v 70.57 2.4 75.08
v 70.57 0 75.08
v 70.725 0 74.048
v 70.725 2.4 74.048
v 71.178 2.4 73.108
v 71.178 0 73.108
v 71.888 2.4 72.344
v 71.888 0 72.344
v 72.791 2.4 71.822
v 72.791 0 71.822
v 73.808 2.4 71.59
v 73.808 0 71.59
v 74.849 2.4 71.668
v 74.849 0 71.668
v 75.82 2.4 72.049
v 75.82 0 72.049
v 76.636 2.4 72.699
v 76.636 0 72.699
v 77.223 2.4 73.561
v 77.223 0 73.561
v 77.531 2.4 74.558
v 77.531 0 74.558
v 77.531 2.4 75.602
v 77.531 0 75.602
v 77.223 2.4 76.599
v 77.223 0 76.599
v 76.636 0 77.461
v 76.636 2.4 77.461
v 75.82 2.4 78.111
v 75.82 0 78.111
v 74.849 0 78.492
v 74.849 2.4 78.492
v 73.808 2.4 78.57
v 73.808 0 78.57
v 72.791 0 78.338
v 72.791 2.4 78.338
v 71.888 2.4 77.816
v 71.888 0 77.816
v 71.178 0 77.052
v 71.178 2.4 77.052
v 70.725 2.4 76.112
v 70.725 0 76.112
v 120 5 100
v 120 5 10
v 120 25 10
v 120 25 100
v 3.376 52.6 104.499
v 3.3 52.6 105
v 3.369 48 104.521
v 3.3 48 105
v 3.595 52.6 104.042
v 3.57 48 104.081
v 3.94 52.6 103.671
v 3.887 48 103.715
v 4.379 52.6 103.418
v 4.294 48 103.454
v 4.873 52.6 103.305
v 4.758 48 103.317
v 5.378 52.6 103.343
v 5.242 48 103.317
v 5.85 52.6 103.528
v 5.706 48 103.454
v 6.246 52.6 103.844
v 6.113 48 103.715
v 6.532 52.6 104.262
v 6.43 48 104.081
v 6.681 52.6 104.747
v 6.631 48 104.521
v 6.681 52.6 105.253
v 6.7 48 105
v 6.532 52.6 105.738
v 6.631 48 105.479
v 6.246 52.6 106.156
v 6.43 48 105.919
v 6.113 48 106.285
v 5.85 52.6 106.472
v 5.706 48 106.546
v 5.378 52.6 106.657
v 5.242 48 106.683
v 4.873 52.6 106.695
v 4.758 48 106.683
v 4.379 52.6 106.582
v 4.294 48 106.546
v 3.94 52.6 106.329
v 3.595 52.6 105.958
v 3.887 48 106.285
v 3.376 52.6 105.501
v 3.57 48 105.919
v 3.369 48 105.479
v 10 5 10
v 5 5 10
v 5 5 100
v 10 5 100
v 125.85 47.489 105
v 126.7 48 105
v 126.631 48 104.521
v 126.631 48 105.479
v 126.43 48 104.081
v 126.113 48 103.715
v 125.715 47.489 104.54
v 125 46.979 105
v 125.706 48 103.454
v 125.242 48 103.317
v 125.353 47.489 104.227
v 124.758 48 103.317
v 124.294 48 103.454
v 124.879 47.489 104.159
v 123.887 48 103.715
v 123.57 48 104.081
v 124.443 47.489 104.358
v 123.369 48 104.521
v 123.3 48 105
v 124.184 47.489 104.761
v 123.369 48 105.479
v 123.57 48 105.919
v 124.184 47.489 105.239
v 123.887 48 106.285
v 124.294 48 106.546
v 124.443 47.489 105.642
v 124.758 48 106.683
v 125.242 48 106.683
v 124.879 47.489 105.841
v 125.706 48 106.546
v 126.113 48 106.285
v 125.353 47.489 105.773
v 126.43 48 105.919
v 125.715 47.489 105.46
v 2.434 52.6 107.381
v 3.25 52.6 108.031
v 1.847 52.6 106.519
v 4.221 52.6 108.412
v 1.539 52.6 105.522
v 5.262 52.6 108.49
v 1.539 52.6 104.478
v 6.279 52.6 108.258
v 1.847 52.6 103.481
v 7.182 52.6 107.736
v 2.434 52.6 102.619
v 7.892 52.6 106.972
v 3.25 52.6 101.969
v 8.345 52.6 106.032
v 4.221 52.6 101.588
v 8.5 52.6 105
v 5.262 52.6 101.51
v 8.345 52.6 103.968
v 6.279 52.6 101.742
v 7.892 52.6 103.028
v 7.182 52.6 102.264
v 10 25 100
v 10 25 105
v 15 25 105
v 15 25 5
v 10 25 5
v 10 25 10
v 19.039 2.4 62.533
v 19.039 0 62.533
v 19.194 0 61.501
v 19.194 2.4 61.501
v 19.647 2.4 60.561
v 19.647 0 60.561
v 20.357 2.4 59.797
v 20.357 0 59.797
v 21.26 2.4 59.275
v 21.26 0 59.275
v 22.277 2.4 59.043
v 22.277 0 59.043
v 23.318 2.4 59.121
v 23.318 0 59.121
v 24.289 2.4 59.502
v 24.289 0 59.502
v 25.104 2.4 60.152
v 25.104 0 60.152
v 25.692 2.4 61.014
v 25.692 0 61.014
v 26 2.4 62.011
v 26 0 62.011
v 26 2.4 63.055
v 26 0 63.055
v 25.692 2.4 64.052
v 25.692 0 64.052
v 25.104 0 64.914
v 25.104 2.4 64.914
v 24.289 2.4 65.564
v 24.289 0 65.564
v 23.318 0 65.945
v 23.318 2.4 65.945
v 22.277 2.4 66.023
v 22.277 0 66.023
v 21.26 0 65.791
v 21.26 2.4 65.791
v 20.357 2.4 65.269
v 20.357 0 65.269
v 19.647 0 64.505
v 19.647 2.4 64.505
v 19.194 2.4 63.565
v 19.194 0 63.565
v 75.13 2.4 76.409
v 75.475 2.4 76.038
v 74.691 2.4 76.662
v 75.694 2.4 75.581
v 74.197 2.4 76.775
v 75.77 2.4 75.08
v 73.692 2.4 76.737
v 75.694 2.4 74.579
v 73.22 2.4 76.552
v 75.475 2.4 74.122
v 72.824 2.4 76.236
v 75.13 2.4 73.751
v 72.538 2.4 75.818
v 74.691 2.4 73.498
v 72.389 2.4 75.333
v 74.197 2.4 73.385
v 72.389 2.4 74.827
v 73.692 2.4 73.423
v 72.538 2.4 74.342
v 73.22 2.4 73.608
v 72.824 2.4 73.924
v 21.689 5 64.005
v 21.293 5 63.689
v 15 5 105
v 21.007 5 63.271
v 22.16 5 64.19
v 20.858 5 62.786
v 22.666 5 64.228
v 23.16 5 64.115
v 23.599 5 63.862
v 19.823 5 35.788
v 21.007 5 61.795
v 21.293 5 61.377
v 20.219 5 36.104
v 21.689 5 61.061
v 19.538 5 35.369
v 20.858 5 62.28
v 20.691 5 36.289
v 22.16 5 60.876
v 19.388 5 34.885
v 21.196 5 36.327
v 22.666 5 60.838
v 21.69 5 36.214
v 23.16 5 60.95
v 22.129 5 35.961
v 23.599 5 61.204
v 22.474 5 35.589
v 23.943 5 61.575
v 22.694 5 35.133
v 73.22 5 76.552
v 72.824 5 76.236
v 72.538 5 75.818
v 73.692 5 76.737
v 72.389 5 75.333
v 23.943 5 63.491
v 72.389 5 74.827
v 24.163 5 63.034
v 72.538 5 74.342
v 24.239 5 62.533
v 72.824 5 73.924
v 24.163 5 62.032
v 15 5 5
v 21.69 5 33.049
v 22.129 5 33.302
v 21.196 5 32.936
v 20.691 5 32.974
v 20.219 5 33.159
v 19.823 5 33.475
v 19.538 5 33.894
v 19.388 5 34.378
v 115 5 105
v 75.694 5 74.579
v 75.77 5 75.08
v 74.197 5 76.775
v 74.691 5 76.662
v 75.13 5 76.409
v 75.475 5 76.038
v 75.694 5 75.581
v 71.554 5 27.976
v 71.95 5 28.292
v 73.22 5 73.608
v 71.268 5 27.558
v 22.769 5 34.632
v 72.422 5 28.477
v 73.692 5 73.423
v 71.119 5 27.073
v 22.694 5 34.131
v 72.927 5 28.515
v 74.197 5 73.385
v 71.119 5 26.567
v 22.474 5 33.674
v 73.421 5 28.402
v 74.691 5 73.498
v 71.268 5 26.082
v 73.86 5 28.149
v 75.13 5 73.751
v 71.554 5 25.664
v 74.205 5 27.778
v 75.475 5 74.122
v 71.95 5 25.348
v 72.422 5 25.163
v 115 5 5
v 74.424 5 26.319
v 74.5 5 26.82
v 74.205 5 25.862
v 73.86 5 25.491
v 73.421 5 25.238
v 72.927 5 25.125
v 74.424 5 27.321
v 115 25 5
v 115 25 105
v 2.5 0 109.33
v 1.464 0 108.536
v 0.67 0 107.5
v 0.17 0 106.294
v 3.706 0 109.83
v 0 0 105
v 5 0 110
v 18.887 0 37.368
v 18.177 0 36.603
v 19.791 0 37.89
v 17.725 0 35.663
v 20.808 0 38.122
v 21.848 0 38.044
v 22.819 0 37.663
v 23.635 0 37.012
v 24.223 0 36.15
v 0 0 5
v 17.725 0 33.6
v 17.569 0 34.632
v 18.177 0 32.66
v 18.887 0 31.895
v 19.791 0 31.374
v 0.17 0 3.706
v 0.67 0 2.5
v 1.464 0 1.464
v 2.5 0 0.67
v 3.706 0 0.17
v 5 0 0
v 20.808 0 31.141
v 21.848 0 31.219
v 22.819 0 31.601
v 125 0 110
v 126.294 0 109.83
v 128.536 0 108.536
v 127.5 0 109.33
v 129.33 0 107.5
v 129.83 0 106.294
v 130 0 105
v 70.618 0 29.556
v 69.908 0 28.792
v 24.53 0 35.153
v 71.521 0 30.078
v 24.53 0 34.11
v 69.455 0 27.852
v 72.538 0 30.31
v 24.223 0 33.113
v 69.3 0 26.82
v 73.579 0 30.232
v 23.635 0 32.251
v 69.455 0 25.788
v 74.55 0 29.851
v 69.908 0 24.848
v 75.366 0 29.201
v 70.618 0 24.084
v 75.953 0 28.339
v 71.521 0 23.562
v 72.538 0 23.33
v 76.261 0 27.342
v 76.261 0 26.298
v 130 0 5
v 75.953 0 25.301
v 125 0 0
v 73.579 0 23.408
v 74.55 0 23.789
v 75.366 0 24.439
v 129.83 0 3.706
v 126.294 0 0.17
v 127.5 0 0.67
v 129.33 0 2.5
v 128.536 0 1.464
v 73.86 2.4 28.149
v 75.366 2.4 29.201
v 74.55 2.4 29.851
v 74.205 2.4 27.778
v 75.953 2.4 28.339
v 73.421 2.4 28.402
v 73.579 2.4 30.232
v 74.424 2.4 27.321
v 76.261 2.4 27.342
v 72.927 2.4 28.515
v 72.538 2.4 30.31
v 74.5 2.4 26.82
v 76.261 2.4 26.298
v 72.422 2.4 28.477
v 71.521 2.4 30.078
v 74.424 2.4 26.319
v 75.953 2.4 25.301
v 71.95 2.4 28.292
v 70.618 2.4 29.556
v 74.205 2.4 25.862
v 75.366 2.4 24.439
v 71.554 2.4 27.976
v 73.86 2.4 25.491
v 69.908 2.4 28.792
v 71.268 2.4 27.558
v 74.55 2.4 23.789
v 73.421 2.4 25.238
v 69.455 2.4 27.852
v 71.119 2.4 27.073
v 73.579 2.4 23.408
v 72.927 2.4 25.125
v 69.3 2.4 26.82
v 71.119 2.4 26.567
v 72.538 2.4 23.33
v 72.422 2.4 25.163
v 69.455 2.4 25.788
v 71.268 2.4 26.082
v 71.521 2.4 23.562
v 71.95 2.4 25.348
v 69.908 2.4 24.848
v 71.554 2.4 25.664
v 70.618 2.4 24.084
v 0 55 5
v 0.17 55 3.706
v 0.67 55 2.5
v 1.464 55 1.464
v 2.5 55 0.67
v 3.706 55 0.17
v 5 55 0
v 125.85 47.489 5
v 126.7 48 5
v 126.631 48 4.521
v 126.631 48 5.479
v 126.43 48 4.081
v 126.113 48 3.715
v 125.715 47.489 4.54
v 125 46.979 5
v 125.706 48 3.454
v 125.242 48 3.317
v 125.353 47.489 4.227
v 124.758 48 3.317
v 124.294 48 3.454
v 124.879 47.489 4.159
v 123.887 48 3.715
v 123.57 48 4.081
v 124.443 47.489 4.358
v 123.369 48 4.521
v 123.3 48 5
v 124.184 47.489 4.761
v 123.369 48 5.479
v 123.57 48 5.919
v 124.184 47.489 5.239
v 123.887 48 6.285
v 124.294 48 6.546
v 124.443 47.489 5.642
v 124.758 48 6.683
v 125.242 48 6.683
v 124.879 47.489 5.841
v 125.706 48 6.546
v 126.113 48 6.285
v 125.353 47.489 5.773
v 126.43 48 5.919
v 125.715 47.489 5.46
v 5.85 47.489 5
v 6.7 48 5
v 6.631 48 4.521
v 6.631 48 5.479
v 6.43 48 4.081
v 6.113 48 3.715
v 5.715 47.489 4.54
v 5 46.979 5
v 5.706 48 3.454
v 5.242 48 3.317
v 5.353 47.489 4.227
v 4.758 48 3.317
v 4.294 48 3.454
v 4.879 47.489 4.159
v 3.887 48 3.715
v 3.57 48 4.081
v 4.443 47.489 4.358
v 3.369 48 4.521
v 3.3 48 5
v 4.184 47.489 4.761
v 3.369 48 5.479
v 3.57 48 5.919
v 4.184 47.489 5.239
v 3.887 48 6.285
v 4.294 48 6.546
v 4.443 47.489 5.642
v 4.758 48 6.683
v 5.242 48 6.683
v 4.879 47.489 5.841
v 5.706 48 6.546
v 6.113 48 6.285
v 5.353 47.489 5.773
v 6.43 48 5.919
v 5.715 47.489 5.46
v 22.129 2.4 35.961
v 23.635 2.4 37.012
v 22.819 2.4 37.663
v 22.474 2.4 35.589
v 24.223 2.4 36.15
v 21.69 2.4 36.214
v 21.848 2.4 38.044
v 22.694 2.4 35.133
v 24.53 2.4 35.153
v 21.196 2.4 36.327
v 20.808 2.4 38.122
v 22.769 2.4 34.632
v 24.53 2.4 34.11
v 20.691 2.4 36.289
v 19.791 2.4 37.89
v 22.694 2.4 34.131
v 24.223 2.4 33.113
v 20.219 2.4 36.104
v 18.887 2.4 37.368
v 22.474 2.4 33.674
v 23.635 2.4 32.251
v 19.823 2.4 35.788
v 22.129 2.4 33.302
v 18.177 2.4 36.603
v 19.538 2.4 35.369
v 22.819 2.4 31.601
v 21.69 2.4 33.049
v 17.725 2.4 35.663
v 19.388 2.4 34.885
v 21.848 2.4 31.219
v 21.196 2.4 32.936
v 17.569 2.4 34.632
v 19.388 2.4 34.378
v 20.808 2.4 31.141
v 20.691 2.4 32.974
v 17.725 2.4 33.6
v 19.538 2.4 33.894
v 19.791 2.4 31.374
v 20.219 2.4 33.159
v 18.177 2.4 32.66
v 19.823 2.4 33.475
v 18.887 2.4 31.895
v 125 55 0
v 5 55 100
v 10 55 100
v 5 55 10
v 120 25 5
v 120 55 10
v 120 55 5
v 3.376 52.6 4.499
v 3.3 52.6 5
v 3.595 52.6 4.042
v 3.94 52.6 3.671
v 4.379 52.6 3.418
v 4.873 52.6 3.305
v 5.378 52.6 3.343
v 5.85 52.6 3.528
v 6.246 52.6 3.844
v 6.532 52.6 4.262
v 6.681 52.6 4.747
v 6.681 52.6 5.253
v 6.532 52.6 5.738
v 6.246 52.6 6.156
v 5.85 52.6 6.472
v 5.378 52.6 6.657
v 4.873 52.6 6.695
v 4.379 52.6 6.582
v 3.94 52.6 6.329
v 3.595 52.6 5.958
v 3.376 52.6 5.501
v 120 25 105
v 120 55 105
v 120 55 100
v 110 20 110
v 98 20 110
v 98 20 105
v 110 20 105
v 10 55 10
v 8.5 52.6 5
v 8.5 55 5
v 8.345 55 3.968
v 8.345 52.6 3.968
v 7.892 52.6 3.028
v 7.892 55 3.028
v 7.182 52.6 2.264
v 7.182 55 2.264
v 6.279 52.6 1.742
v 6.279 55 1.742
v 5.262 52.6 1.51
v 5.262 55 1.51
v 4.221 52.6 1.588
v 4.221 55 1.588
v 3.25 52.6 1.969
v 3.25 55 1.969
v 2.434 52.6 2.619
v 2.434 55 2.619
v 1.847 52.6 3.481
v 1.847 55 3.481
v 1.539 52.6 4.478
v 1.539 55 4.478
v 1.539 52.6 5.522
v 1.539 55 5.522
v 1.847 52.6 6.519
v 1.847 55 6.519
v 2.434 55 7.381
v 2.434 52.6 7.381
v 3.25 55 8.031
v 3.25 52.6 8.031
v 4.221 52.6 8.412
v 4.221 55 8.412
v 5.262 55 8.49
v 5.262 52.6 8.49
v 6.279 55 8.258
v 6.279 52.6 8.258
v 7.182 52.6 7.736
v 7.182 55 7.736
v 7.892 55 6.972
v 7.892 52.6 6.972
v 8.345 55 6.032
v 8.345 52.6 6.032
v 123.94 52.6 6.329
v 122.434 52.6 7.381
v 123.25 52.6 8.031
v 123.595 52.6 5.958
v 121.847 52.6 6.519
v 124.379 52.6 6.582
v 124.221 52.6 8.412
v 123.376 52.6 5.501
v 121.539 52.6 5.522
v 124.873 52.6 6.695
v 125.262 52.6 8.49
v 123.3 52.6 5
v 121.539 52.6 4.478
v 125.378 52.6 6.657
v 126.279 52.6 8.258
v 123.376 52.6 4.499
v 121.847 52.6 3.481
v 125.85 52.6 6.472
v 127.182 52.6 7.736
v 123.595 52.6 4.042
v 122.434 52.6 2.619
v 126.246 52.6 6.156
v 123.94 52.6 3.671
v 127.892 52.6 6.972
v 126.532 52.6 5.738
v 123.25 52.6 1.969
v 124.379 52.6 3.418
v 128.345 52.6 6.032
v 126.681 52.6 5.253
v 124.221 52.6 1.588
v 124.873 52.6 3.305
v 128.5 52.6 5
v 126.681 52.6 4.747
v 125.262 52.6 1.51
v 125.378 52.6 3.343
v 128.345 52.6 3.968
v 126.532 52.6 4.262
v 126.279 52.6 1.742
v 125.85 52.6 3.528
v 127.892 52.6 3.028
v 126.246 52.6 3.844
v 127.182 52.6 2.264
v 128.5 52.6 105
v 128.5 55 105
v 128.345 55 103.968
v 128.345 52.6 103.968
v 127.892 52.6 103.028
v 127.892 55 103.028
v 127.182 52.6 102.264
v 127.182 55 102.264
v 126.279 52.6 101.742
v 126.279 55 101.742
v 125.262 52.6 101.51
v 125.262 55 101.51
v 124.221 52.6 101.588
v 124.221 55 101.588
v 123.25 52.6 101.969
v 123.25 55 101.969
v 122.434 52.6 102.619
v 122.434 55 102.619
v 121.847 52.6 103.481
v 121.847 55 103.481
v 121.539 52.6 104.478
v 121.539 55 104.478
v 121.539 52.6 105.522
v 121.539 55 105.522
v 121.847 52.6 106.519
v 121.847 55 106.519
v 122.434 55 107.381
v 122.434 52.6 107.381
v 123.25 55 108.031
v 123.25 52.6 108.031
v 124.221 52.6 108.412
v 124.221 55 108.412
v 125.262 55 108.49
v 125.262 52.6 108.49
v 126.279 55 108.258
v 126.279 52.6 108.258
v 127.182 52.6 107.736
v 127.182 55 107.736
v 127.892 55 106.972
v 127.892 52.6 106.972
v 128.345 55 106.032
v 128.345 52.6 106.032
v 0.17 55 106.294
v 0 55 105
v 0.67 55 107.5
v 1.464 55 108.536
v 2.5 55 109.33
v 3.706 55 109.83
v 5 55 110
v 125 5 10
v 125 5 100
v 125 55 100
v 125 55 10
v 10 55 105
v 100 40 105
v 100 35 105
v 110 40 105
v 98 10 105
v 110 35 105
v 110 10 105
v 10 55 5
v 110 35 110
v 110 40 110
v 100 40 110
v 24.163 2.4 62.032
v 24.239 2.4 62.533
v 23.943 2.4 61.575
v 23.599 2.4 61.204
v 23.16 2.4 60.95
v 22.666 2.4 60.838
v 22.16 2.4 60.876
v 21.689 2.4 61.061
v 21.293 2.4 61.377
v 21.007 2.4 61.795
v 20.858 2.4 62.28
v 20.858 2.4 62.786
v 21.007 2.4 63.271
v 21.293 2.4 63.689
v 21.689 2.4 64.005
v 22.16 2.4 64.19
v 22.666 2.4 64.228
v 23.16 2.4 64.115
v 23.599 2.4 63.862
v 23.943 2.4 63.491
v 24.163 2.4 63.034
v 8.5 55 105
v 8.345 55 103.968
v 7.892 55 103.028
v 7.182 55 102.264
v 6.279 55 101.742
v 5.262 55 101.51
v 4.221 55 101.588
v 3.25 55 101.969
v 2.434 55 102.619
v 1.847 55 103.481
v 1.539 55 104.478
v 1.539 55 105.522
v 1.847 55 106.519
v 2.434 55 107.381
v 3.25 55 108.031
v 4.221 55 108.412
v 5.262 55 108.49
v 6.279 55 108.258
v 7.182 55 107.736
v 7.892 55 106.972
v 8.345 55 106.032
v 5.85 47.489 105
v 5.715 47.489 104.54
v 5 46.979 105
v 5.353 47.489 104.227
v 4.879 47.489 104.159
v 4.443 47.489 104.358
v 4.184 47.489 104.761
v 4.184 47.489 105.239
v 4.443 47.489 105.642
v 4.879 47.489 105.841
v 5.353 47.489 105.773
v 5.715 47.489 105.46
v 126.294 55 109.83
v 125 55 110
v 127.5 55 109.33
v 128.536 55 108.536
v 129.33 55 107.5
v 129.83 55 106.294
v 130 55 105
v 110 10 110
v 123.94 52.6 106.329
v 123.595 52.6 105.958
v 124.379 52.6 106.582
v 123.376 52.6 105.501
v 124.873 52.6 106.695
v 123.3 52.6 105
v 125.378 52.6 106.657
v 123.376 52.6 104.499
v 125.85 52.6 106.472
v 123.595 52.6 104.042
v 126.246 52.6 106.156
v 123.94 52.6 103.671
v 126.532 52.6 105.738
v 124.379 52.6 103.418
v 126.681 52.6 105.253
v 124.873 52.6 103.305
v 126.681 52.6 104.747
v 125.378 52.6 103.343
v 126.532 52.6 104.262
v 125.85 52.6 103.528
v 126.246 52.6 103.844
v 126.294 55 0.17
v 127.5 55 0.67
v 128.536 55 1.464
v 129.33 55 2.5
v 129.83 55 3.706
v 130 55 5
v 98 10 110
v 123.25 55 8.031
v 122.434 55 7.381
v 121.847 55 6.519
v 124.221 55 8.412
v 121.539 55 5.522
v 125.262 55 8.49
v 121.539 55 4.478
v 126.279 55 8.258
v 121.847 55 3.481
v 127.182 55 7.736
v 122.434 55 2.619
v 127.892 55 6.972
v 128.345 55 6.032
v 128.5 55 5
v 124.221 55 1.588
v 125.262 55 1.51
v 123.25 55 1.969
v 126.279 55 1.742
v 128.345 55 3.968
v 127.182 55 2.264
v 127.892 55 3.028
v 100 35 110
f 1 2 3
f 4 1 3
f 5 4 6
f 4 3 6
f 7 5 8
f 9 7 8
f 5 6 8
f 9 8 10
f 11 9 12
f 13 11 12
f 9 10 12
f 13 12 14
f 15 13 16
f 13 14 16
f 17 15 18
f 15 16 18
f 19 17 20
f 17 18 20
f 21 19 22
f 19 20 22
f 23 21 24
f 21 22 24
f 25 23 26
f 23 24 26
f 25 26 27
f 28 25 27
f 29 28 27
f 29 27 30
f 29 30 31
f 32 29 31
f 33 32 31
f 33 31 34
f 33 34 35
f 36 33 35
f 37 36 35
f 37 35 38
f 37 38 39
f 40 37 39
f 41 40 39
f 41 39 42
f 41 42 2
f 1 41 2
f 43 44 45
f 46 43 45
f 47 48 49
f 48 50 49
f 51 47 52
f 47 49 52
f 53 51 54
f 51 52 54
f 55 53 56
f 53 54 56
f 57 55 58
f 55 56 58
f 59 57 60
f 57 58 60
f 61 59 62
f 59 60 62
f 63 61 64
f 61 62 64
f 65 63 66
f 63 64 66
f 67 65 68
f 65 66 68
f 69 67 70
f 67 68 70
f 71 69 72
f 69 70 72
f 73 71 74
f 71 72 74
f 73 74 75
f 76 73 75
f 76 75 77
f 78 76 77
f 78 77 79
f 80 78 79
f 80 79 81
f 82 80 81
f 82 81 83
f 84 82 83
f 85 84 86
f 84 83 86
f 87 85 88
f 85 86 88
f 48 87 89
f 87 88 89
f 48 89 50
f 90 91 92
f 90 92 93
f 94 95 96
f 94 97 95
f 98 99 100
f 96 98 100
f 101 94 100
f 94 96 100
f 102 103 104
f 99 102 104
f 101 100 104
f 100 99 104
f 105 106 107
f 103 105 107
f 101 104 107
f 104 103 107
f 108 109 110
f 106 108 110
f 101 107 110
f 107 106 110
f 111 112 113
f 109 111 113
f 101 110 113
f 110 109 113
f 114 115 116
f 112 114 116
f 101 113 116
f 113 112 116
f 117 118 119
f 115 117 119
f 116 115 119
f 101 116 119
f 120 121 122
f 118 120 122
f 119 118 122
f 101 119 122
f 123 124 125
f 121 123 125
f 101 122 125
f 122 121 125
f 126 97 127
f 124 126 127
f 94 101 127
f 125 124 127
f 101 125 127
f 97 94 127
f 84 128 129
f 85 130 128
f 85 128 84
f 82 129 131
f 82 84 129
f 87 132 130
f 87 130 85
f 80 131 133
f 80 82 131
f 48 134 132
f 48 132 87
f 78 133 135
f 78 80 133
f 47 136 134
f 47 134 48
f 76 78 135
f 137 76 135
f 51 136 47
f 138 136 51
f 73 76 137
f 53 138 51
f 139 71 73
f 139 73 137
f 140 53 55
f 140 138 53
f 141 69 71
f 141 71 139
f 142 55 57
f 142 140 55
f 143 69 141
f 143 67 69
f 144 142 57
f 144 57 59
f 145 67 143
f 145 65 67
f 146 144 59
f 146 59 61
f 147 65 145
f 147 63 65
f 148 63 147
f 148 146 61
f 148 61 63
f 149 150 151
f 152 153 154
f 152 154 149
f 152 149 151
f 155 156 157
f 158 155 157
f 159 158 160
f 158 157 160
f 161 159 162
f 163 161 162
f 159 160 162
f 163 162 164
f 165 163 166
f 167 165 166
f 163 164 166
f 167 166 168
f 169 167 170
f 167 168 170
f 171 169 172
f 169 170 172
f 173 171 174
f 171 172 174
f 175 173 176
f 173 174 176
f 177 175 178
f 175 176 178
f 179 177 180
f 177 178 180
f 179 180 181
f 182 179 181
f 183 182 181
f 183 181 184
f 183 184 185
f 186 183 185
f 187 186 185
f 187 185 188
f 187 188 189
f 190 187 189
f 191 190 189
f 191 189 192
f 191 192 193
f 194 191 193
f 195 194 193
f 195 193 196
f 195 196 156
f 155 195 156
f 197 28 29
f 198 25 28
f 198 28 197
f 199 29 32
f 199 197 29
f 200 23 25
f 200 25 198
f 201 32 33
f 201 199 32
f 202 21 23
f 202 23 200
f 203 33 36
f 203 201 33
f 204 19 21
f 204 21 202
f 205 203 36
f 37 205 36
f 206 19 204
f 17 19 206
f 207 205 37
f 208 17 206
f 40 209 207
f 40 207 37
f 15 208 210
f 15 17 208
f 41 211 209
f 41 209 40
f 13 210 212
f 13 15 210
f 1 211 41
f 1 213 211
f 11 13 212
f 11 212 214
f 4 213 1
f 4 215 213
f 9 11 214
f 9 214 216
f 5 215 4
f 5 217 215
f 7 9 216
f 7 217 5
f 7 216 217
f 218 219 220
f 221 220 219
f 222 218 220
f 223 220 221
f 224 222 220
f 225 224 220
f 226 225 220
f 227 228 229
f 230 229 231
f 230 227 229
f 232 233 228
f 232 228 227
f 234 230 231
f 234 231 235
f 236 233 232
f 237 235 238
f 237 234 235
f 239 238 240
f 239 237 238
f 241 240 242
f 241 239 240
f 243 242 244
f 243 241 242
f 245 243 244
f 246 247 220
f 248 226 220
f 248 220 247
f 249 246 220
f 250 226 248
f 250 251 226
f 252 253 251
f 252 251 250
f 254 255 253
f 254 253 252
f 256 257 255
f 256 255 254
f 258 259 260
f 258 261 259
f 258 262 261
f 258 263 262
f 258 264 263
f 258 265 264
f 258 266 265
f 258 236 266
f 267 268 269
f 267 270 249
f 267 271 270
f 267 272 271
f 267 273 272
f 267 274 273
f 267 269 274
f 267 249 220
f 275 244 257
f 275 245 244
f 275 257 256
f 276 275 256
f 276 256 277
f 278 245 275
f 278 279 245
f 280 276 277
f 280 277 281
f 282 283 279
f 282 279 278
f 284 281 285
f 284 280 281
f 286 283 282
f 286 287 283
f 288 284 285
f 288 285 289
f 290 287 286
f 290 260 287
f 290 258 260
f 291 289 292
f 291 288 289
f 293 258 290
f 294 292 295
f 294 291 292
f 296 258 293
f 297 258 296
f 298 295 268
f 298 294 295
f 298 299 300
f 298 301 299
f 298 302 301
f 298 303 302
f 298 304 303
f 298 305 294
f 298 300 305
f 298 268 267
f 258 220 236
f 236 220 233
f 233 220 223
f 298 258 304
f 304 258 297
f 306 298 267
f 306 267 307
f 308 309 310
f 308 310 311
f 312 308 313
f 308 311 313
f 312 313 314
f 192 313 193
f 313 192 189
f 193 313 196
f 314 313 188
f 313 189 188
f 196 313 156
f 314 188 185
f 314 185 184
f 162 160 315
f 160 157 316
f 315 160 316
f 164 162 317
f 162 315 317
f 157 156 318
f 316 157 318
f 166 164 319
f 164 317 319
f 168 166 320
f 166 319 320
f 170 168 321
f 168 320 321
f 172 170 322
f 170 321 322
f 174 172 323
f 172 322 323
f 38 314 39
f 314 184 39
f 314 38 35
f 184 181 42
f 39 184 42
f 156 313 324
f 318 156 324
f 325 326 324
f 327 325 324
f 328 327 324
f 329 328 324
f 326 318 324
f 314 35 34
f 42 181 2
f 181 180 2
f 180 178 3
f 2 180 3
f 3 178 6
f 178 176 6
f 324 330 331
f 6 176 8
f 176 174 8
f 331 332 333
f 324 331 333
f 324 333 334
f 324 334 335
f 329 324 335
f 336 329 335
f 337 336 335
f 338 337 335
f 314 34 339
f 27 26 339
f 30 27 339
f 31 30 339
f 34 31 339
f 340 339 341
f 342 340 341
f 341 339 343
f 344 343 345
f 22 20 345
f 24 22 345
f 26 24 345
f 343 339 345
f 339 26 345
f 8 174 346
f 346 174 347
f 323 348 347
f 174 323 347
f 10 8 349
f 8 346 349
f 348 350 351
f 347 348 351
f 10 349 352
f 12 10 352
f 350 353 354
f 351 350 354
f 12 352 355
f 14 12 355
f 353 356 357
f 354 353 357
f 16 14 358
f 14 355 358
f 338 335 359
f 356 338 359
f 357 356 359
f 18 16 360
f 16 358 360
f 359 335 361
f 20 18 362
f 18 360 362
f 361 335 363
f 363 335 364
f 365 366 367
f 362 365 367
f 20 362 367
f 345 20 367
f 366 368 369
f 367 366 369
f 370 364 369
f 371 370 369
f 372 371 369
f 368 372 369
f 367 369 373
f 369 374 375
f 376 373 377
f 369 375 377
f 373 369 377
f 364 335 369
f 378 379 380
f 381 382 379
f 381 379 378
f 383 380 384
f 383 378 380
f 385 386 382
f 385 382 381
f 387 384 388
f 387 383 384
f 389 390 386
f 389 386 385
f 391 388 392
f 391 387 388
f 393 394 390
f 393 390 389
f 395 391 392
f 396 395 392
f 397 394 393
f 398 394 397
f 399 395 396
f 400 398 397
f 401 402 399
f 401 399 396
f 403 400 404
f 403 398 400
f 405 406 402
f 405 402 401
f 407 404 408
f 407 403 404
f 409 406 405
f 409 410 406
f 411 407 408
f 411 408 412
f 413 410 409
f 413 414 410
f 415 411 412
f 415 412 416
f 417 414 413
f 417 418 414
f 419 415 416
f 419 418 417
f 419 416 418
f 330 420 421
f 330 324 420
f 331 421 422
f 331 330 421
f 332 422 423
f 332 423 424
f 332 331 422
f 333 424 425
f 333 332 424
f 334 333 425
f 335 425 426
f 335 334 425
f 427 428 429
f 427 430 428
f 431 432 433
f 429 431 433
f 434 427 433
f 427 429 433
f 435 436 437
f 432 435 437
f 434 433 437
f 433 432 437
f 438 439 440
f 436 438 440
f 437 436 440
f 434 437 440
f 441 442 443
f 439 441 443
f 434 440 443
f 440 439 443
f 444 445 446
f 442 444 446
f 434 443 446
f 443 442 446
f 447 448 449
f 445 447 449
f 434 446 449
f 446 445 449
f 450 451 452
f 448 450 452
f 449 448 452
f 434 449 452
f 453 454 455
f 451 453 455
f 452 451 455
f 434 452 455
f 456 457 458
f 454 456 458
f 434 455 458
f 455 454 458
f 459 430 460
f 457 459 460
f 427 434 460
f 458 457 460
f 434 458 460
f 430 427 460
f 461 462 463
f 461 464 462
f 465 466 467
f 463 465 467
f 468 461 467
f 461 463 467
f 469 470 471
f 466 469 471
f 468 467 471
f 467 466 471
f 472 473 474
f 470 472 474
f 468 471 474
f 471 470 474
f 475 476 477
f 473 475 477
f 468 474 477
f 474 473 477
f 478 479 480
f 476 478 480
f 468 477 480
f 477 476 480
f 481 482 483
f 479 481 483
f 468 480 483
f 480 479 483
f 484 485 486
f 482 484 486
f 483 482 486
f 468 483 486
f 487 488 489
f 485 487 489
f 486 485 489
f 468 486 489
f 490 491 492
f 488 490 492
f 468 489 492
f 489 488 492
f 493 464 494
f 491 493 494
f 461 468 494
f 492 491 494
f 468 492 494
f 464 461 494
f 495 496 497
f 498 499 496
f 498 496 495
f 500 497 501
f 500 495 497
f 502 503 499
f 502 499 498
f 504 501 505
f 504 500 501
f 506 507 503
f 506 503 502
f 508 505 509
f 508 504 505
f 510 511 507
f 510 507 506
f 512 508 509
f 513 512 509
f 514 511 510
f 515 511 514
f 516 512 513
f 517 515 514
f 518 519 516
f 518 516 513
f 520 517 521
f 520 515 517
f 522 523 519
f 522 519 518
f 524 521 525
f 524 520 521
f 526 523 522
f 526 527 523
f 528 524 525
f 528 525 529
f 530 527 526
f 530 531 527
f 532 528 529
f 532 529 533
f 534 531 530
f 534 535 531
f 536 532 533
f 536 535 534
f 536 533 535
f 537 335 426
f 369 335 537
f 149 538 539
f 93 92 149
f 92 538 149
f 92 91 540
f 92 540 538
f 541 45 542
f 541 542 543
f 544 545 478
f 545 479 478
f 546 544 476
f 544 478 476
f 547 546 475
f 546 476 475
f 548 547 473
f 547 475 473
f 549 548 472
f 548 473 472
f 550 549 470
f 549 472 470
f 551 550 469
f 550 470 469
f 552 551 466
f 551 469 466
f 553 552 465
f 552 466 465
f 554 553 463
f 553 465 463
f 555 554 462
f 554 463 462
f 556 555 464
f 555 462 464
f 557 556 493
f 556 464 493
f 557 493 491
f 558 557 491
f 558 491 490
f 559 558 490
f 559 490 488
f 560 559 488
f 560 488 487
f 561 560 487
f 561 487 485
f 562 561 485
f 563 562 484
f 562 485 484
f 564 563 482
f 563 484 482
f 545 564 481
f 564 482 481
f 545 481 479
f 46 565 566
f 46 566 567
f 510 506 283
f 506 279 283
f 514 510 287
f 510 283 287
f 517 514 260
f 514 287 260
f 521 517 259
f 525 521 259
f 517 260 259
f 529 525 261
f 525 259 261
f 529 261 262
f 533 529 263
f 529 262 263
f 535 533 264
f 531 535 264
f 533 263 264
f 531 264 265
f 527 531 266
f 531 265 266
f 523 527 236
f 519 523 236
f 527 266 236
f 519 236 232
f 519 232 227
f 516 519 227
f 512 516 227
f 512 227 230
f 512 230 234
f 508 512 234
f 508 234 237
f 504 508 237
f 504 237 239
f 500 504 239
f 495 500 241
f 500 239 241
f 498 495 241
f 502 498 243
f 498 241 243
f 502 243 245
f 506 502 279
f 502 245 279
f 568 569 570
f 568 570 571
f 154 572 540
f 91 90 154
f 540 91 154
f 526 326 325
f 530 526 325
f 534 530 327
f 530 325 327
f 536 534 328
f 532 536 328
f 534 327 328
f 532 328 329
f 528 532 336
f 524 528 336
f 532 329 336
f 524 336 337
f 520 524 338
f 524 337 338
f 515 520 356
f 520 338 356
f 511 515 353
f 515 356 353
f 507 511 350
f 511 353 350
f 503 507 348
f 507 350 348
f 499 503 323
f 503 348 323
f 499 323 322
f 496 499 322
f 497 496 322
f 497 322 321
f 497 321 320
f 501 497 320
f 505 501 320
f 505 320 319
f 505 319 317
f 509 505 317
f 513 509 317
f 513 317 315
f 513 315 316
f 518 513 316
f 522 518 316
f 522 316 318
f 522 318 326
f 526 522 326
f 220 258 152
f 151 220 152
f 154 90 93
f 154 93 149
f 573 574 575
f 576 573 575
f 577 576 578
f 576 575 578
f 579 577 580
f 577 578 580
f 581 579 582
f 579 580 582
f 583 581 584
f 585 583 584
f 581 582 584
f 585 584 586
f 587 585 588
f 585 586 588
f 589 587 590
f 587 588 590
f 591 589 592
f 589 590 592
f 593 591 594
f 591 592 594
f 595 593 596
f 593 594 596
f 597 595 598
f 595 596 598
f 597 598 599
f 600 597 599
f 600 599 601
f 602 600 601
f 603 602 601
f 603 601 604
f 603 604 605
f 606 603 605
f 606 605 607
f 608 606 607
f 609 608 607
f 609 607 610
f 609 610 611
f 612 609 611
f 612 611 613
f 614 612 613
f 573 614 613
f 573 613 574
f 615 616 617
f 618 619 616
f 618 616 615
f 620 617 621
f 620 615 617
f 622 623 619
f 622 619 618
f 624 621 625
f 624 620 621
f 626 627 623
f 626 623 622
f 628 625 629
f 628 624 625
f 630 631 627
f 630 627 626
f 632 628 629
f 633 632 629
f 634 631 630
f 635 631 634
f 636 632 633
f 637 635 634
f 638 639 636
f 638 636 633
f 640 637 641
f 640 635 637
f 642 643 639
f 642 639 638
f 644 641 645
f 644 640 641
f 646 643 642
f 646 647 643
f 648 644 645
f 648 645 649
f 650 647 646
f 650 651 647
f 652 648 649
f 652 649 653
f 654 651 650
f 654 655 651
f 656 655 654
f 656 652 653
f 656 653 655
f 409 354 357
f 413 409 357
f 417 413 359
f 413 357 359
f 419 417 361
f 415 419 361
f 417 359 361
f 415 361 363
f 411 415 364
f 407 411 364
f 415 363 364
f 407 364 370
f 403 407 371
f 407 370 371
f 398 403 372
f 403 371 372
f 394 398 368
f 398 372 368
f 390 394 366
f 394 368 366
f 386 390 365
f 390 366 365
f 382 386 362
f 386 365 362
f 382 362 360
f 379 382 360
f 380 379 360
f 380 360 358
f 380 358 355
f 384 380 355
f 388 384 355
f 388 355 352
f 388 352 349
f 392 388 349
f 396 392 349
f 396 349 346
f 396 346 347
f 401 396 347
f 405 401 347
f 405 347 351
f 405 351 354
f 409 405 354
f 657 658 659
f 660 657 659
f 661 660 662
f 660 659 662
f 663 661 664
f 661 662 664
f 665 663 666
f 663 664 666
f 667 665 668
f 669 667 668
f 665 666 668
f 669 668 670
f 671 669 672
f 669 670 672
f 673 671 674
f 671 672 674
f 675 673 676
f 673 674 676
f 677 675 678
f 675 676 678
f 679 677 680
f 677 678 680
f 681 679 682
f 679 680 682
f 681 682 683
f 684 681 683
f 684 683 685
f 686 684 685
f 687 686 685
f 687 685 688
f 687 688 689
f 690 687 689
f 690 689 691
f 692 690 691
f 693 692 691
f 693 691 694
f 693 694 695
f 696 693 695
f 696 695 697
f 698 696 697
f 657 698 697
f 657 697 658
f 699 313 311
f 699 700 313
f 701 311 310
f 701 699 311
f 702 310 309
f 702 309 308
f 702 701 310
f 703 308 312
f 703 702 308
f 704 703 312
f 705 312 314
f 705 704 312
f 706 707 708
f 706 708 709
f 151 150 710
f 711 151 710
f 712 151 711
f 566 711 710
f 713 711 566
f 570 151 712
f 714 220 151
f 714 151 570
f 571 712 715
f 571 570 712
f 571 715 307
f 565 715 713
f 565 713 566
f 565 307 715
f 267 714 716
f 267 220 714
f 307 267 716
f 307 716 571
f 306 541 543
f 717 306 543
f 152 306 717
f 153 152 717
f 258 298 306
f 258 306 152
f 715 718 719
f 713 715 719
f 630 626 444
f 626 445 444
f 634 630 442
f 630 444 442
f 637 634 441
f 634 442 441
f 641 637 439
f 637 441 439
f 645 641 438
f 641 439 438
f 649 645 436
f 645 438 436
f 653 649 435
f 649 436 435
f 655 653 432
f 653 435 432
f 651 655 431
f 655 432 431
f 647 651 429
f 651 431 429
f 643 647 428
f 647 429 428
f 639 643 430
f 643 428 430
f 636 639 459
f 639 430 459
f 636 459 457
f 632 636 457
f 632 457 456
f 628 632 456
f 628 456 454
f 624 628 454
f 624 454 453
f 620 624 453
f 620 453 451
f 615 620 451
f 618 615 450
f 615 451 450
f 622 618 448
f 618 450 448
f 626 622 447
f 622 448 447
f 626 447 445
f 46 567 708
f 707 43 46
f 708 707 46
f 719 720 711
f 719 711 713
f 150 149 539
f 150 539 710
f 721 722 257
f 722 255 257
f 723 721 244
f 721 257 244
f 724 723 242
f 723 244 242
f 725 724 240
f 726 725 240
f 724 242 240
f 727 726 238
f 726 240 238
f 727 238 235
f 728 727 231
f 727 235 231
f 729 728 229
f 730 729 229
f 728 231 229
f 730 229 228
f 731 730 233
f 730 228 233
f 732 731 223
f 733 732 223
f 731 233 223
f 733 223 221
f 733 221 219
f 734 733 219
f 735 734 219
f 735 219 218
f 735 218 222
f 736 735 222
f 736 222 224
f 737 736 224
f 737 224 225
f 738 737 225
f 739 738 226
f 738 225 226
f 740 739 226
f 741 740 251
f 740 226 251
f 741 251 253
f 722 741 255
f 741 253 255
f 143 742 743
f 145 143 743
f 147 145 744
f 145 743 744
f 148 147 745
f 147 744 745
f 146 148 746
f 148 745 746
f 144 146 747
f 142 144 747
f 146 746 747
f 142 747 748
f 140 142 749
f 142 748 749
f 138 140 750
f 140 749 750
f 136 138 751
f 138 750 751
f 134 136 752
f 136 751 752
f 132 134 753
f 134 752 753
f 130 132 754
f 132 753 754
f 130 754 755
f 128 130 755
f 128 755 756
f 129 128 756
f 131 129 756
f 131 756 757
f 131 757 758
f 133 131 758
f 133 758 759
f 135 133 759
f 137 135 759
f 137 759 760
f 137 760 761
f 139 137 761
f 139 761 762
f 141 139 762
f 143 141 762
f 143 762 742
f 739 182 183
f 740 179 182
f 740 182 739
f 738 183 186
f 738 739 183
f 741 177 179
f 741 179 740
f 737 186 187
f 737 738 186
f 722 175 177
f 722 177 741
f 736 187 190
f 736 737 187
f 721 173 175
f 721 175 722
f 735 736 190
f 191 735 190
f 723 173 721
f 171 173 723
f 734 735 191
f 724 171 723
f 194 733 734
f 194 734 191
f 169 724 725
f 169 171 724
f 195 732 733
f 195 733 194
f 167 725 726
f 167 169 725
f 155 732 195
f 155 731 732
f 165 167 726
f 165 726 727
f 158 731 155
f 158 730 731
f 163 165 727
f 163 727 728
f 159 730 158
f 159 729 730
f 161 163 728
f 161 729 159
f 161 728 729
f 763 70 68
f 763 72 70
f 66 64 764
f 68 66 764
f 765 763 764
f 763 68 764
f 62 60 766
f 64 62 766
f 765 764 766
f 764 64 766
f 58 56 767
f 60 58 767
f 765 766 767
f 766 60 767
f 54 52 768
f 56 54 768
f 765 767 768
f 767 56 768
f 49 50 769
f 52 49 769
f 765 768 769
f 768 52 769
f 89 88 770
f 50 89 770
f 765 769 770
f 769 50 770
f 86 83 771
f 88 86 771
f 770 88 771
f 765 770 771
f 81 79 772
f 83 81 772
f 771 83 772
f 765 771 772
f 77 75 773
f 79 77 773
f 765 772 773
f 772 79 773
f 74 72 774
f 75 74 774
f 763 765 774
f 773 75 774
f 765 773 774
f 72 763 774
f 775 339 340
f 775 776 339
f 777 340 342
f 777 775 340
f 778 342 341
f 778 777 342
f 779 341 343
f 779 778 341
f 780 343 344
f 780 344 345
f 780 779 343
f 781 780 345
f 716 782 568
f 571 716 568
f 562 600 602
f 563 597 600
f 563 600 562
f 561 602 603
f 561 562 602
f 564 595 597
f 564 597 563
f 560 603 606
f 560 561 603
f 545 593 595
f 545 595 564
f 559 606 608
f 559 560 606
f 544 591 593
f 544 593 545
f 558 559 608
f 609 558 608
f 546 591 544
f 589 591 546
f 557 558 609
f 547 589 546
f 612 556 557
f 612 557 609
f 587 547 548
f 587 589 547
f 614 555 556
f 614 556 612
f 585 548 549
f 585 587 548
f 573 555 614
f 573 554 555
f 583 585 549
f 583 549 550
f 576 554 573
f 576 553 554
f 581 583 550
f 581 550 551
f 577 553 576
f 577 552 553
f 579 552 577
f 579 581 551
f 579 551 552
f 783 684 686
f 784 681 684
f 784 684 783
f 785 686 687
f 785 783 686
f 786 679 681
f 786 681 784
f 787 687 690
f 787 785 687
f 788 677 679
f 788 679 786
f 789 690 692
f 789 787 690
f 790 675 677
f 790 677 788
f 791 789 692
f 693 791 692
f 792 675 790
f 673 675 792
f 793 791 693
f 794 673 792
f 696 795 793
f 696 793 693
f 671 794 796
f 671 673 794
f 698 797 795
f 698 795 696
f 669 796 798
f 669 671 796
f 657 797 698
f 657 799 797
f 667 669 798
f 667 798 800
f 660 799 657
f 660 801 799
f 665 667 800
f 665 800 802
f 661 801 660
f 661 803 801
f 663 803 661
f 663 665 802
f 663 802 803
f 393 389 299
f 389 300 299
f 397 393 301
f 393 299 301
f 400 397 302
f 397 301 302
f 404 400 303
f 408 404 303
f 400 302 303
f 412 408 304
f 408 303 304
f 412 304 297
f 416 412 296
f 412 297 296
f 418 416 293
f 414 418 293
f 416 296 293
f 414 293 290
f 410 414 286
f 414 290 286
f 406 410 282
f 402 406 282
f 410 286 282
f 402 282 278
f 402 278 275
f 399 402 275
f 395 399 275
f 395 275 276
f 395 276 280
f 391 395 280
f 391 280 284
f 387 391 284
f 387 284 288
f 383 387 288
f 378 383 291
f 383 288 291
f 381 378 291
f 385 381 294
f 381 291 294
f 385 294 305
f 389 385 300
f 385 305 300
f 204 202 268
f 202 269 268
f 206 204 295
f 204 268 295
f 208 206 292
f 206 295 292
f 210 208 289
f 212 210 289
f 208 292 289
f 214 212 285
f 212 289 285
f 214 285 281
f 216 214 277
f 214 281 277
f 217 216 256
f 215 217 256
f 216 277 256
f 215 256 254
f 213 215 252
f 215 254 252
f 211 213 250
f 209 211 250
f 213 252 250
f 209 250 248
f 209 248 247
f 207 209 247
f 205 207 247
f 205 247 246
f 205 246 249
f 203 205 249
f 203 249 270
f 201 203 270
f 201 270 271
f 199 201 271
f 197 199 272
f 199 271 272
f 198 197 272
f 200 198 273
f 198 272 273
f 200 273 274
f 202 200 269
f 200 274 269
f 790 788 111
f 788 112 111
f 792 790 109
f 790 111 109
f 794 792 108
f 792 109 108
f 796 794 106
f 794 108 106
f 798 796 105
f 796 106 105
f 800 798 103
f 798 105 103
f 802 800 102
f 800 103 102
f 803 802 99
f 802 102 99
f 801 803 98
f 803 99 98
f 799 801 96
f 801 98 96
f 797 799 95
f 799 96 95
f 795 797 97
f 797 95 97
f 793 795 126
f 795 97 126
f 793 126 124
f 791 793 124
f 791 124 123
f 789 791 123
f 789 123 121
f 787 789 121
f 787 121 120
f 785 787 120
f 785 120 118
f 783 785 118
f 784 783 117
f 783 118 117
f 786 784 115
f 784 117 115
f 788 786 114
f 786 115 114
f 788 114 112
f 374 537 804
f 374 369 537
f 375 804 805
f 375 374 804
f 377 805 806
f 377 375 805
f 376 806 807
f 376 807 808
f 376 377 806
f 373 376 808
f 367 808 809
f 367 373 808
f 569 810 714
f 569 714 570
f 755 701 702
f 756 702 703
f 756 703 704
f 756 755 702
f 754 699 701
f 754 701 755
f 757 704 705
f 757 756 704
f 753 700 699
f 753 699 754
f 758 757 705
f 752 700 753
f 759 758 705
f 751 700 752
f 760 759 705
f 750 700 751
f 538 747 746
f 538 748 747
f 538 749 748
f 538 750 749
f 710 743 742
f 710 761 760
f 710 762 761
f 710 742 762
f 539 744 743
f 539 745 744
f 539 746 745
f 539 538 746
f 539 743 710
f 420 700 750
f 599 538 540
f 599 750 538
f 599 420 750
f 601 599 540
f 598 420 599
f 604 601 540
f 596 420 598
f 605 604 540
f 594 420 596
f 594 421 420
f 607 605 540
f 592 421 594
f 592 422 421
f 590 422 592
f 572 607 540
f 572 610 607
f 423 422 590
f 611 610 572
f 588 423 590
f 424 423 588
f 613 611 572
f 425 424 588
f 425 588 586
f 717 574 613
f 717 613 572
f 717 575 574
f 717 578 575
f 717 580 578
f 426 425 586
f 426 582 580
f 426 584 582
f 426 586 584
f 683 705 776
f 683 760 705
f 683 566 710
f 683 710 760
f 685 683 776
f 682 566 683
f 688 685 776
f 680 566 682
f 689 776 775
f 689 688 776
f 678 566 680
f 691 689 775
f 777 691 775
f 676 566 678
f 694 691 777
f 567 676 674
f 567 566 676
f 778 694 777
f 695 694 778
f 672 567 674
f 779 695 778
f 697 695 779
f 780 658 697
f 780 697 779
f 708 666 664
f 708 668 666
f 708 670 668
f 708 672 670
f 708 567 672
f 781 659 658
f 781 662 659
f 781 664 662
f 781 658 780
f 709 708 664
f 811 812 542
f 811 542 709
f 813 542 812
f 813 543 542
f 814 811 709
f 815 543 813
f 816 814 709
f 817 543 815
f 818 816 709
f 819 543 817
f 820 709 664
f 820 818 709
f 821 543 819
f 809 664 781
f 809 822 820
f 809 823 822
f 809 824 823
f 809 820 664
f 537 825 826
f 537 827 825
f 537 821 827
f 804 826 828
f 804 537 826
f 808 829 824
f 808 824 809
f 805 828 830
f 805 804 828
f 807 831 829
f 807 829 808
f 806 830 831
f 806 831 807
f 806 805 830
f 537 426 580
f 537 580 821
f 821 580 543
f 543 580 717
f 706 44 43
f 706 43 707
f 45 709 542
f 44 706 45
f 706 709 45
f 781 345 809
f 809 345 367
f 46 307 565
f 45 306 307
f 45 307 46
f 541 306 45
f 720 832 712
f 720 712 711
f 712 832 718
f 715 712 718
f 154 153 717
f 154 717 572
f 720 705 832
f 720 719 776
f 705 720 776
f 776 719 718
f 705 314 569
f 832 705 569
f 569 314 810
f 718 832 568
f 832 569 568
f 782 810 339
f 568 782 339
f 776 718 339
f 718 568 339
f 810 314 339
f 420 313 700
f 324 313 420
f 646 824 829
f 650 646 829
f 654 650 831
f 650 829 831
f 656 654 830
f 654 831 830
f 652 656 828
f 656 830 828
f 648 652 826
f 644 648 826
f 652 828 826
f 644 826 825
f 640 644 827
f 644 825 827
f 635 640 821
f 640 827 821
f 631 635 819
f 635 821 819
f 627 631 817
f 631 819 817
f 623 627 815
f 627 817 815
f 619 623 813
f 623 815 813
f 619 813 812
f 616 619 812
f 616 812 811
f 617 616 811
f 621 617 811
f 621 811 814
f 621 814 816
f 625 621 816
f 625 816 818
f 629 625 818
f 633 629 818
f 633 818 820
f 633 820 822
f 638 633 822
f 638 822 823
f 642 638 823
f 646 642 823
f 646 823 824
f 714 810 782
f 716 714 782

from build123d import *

# Parameters (mm, degrees)
SKETCH1_W                                        = 130
SKETCH1_H                                        = 110
BOSS_EXTRUDE1_DEPTH                              = 5
SKETCH2_W                                        = 130
SKETCH2_H                                        = 110
BOSS_EXTRUDE2_DEPTH                              = 50
CBORE_FOR_M3_PAN_HEAD_MACHINE_SCREW1_D           = 3.4
CBORE_FOR_M3_PAN_HEAD_MACHINE_SCREW1_DEPTH       = 7
CBORE_FOR_M3_PAN_HEAD_MACHINE_SCREW1_CBORE_D     = 7
CBORE_FOR_M3_PAN_HEAD_MACHINE_SCREW1_CBORE_DEPTH = 2.4
CBORE_FOR_M3_PAN_HEAD_MACHINE_SCREW1_TIP         = 1.021463052
CBORE_FOR_M3_PAN_HEAD_MACHINE_SCREW2_D           = 3.4
CBORE_FOR_M3_PAN_HEAD_MACHINE_SCREW2_DEPTH       = 7
CBORE_FOR_M3_PAN_HEAD_MACHINE_SCREW2_CBORE_D     = 7
CBORE_FOR_M3_PAN_HEAD_MACHINE_SCREW2_CBORE_DEPTH = 2.4
CBORE_FOR_M3_PAN_HEAD_MACHINE_SCREW2_TIP         = 1.021463052
BOSS_EXTRUDE3_REACH                              = 177.926
SKETCH8_W                                        = 5
SKETCH8_H                                        = 20
SKETCH9_W                                        = 5
SKETCH9_H                                        = 20
BOSS_EXTRUDE4_DEPTH                              = 100
CUT_EXTRUDE2_REACH                               = 180.955
SKETCH10_W                                       = 12
SKETCH10_H                                       = 10
CUT_EXTRUDE3_REACH                               = 180.955
SKETCH11_W                                       = 10
SKETCH11_H                                       = 5
FILLET6_R                                        = 5


with BuildPart() as part:
    # Sketch1 → Boss-Extrude1 (new body)
    with BuildSketch(Plane(origin=(0, 0, 0), x_dir=(1, 0, 0), z_dir=(0, 1, 0))):
        with Locations((65, -55)):
            Rectangle(SKETCH1_W, SKETCH1_H)
    extrude(amount=BOSS_EXTRUDE1_DEPTH)

    # Sketch2 → Boss-Extrude2 (add)
    with BuildSketch(Plane(origin=(0, 5, 0), x_dir=(1, 0, 0), z_dir=(0, 1, 0))):
        with Locations((65, -55)):
            Rectangle(SKETCH2_W, SKETCH2_H)
        Polygon((10, -105), (120, -105), (120, -100), (125, -100), (125, -10), (120, -10), (120, -5), (10, -5), (10, -10), (5, -10), (5, -100), (10, -100), align=None, mode=Mode.SUBTRACT)
    extrude(amount=BOSS_EXTRUDE2_DEPTH)

    # CBORE for M3 Pan Head Machine Screw1
    with Locations(Plane(origin=(0, 55, 0), x_dir=(1, 0, 0), z_dir=(0, 1, 0))):
        with Locations((5, -5), (125, -105), (5, -105), (125, -5)):
            CounterBoreHole(CBORE_FOR_M3_PAN_HEAD_MACHINE_SCREW1_D / 2, CBORE_FOR_M3_PAN_HEAD_MACHINE_SCREW1_CBORE_D / 2, CBORE_FOR_M3_PAN_HEAD_MACHINE_SCREW1_CBORE_DEPTH, depth=CBORE_FOR_M3_PAN_HEAD_MACHINE_SCREW1_DEPTH)
            with Locations((0, 0, -(CBORE_FOR_M3_PAN_HEAD_MACHINE_SCREW1_DEPTH + CBORE_FOR_M3_PAN_HEAD_MACHINE_SCREW1_TIP / 2))):  # 118° drill point
                Cone(0, CBORE_FOR_M3_PAN_HEAD_MACHINE_SCREW1_D / 2, CBORE_FOR_M3_PAN_HEAD_MACHINE_SCREW1_TIP, mode=Mode.SUBTRACT)

    # CBORE for M3 Pan Head Machine Screw2
    with Locations(Plane(origin=(0, 0, 0), x_dir=(-1, 0, 0), z_dir=(0, -1, 0))):
        with Locations((-74.07, -75.08), (-72.8, -26.82), (-22.538761246, -62.532927336), (-21.069252595, -34.631598616)):
            CounterBoreHole(CBORE_FOR_M3_PAN_HEAD_MACHINE_SCREW2_D / 2, CBORE_FOR_M3_PAN_HEAD_MACHINE_SCREW2_CBORE_D / 2, CBORE_FOR_M3_PAN_HEAD_MACHINE_SCREW2_CBORE_DEPTH, depth=CBORE_FOR_M3_PAN_HEAD_MACHINE_SCREW2_DEPTH)
            with Locations((0, 0, -(CBORE_FOR_M3_PAN_HEAD_MACHINE_SCREW2_DEPTH + CBORE_FOR_M3_PAN_HEAD_MACHINE_SCREW2_TIP / 2))):  # 118° drill point
                Cone(0, CBORE_FOR_M3_PAN_HEAD_MACHINE_SCREW2_D / 2, CBORE_FOR_M3_PAN_HEAD_MACHINE_SCREW2_TIP, mode=Mode.SUBTRACT)

    # Boss-Extrude3: up to this face of the body (flat: up to its plane)
    boss_extrude3_end = Plane(part.part.faces().sort_by_distance((65, 30, 105))[0])
    # Sketch8 → Boss-Extrude3 (add, up to the picked face)
    with BuildSketch(Plane.XY.offset(5), mode=Mode.PRIVATE) as boss_extrude3_sk1:
        with Locations((117.5, 15)):
            Rectangle(SKETCH8_W, SKETCH8_H)
    boss_extrude3_tool1 = split(extrude(boss_extrude3_sk1.sketch, amount=BOSS_EXTRUDE3_REACH, mode=Mode.PRIVATE), bisect_by=boss_extrude3_end, keep=Keep.BOTH, mode=Mode.PRIVATE)
    add(boss_extrude3_tool1.solids().sort_by(Axis((117.5, 15, 5), (0, 0, 1)))[0])

    # Sketch9 → Boss-Extrude4 (add)
    with BuildSketch(Plane.XY.offset(5)):
        with Locations((12.5, 15)):
            Rectangle(SKETCH9_W, SKETCH9_H)
    extrude(amount=BOSS_EXTRUDE4_DEPTH)

    # Sketch10 → Cut-Extrude2 (cut, up to next)
    with BuildSketch(Plane.XY.offset(110), mode=Mode.PRIVATE) as cut_extrude2_sk1:
        with Locations((104, 15)):
            Rectangle(SKETCH10_W, SKETCH10_H)
    cut_extrude2_tool1 = extrude(cut_extrude2_sk1.sketch, amount=-CUT_EXTRUDE2_REACH, mode=Mode.PRIVATE) & part.part
    add(cut_extrude2_tool1.solids().sort_by_distance((104, 15, 110))[0], mode=Mode.SUBTRACT)

    # Sketch11 → Cut-Extrude3 (cut, up to next)
    with BuildSketch(Plane.XY.offset(110), mode=Mode.PRIVATE) as cut_extrude3_sk1:
        with Locations((105, 37.5)):
            Rectangle(SKETCH11_W, SKETCH11_H)
    cut_extrude3_tool1 = extrude(cut_extrude3_sk1.sketch, amount=-CUT_EXTRUDE3_REACH, mode=Mode.PRIVATE) & part.part
    add(cut_extrude3_tool1.solids().sort_by_distance((105, 37.5, 110))[0], mode=Mode.SUBTRACT)

    # Fillet6
    fillet6_edges = [part.edges().sort_by_distance(p)[0] for p in [
        (0, 27.5, 0),
        (130, 27.5, 0),
        (130, 27.5, 110),
        (0, 27.5, 110),
    ]]
    fillet(fillet6_edges, radius=FILLET6_R)


solid = part.part
